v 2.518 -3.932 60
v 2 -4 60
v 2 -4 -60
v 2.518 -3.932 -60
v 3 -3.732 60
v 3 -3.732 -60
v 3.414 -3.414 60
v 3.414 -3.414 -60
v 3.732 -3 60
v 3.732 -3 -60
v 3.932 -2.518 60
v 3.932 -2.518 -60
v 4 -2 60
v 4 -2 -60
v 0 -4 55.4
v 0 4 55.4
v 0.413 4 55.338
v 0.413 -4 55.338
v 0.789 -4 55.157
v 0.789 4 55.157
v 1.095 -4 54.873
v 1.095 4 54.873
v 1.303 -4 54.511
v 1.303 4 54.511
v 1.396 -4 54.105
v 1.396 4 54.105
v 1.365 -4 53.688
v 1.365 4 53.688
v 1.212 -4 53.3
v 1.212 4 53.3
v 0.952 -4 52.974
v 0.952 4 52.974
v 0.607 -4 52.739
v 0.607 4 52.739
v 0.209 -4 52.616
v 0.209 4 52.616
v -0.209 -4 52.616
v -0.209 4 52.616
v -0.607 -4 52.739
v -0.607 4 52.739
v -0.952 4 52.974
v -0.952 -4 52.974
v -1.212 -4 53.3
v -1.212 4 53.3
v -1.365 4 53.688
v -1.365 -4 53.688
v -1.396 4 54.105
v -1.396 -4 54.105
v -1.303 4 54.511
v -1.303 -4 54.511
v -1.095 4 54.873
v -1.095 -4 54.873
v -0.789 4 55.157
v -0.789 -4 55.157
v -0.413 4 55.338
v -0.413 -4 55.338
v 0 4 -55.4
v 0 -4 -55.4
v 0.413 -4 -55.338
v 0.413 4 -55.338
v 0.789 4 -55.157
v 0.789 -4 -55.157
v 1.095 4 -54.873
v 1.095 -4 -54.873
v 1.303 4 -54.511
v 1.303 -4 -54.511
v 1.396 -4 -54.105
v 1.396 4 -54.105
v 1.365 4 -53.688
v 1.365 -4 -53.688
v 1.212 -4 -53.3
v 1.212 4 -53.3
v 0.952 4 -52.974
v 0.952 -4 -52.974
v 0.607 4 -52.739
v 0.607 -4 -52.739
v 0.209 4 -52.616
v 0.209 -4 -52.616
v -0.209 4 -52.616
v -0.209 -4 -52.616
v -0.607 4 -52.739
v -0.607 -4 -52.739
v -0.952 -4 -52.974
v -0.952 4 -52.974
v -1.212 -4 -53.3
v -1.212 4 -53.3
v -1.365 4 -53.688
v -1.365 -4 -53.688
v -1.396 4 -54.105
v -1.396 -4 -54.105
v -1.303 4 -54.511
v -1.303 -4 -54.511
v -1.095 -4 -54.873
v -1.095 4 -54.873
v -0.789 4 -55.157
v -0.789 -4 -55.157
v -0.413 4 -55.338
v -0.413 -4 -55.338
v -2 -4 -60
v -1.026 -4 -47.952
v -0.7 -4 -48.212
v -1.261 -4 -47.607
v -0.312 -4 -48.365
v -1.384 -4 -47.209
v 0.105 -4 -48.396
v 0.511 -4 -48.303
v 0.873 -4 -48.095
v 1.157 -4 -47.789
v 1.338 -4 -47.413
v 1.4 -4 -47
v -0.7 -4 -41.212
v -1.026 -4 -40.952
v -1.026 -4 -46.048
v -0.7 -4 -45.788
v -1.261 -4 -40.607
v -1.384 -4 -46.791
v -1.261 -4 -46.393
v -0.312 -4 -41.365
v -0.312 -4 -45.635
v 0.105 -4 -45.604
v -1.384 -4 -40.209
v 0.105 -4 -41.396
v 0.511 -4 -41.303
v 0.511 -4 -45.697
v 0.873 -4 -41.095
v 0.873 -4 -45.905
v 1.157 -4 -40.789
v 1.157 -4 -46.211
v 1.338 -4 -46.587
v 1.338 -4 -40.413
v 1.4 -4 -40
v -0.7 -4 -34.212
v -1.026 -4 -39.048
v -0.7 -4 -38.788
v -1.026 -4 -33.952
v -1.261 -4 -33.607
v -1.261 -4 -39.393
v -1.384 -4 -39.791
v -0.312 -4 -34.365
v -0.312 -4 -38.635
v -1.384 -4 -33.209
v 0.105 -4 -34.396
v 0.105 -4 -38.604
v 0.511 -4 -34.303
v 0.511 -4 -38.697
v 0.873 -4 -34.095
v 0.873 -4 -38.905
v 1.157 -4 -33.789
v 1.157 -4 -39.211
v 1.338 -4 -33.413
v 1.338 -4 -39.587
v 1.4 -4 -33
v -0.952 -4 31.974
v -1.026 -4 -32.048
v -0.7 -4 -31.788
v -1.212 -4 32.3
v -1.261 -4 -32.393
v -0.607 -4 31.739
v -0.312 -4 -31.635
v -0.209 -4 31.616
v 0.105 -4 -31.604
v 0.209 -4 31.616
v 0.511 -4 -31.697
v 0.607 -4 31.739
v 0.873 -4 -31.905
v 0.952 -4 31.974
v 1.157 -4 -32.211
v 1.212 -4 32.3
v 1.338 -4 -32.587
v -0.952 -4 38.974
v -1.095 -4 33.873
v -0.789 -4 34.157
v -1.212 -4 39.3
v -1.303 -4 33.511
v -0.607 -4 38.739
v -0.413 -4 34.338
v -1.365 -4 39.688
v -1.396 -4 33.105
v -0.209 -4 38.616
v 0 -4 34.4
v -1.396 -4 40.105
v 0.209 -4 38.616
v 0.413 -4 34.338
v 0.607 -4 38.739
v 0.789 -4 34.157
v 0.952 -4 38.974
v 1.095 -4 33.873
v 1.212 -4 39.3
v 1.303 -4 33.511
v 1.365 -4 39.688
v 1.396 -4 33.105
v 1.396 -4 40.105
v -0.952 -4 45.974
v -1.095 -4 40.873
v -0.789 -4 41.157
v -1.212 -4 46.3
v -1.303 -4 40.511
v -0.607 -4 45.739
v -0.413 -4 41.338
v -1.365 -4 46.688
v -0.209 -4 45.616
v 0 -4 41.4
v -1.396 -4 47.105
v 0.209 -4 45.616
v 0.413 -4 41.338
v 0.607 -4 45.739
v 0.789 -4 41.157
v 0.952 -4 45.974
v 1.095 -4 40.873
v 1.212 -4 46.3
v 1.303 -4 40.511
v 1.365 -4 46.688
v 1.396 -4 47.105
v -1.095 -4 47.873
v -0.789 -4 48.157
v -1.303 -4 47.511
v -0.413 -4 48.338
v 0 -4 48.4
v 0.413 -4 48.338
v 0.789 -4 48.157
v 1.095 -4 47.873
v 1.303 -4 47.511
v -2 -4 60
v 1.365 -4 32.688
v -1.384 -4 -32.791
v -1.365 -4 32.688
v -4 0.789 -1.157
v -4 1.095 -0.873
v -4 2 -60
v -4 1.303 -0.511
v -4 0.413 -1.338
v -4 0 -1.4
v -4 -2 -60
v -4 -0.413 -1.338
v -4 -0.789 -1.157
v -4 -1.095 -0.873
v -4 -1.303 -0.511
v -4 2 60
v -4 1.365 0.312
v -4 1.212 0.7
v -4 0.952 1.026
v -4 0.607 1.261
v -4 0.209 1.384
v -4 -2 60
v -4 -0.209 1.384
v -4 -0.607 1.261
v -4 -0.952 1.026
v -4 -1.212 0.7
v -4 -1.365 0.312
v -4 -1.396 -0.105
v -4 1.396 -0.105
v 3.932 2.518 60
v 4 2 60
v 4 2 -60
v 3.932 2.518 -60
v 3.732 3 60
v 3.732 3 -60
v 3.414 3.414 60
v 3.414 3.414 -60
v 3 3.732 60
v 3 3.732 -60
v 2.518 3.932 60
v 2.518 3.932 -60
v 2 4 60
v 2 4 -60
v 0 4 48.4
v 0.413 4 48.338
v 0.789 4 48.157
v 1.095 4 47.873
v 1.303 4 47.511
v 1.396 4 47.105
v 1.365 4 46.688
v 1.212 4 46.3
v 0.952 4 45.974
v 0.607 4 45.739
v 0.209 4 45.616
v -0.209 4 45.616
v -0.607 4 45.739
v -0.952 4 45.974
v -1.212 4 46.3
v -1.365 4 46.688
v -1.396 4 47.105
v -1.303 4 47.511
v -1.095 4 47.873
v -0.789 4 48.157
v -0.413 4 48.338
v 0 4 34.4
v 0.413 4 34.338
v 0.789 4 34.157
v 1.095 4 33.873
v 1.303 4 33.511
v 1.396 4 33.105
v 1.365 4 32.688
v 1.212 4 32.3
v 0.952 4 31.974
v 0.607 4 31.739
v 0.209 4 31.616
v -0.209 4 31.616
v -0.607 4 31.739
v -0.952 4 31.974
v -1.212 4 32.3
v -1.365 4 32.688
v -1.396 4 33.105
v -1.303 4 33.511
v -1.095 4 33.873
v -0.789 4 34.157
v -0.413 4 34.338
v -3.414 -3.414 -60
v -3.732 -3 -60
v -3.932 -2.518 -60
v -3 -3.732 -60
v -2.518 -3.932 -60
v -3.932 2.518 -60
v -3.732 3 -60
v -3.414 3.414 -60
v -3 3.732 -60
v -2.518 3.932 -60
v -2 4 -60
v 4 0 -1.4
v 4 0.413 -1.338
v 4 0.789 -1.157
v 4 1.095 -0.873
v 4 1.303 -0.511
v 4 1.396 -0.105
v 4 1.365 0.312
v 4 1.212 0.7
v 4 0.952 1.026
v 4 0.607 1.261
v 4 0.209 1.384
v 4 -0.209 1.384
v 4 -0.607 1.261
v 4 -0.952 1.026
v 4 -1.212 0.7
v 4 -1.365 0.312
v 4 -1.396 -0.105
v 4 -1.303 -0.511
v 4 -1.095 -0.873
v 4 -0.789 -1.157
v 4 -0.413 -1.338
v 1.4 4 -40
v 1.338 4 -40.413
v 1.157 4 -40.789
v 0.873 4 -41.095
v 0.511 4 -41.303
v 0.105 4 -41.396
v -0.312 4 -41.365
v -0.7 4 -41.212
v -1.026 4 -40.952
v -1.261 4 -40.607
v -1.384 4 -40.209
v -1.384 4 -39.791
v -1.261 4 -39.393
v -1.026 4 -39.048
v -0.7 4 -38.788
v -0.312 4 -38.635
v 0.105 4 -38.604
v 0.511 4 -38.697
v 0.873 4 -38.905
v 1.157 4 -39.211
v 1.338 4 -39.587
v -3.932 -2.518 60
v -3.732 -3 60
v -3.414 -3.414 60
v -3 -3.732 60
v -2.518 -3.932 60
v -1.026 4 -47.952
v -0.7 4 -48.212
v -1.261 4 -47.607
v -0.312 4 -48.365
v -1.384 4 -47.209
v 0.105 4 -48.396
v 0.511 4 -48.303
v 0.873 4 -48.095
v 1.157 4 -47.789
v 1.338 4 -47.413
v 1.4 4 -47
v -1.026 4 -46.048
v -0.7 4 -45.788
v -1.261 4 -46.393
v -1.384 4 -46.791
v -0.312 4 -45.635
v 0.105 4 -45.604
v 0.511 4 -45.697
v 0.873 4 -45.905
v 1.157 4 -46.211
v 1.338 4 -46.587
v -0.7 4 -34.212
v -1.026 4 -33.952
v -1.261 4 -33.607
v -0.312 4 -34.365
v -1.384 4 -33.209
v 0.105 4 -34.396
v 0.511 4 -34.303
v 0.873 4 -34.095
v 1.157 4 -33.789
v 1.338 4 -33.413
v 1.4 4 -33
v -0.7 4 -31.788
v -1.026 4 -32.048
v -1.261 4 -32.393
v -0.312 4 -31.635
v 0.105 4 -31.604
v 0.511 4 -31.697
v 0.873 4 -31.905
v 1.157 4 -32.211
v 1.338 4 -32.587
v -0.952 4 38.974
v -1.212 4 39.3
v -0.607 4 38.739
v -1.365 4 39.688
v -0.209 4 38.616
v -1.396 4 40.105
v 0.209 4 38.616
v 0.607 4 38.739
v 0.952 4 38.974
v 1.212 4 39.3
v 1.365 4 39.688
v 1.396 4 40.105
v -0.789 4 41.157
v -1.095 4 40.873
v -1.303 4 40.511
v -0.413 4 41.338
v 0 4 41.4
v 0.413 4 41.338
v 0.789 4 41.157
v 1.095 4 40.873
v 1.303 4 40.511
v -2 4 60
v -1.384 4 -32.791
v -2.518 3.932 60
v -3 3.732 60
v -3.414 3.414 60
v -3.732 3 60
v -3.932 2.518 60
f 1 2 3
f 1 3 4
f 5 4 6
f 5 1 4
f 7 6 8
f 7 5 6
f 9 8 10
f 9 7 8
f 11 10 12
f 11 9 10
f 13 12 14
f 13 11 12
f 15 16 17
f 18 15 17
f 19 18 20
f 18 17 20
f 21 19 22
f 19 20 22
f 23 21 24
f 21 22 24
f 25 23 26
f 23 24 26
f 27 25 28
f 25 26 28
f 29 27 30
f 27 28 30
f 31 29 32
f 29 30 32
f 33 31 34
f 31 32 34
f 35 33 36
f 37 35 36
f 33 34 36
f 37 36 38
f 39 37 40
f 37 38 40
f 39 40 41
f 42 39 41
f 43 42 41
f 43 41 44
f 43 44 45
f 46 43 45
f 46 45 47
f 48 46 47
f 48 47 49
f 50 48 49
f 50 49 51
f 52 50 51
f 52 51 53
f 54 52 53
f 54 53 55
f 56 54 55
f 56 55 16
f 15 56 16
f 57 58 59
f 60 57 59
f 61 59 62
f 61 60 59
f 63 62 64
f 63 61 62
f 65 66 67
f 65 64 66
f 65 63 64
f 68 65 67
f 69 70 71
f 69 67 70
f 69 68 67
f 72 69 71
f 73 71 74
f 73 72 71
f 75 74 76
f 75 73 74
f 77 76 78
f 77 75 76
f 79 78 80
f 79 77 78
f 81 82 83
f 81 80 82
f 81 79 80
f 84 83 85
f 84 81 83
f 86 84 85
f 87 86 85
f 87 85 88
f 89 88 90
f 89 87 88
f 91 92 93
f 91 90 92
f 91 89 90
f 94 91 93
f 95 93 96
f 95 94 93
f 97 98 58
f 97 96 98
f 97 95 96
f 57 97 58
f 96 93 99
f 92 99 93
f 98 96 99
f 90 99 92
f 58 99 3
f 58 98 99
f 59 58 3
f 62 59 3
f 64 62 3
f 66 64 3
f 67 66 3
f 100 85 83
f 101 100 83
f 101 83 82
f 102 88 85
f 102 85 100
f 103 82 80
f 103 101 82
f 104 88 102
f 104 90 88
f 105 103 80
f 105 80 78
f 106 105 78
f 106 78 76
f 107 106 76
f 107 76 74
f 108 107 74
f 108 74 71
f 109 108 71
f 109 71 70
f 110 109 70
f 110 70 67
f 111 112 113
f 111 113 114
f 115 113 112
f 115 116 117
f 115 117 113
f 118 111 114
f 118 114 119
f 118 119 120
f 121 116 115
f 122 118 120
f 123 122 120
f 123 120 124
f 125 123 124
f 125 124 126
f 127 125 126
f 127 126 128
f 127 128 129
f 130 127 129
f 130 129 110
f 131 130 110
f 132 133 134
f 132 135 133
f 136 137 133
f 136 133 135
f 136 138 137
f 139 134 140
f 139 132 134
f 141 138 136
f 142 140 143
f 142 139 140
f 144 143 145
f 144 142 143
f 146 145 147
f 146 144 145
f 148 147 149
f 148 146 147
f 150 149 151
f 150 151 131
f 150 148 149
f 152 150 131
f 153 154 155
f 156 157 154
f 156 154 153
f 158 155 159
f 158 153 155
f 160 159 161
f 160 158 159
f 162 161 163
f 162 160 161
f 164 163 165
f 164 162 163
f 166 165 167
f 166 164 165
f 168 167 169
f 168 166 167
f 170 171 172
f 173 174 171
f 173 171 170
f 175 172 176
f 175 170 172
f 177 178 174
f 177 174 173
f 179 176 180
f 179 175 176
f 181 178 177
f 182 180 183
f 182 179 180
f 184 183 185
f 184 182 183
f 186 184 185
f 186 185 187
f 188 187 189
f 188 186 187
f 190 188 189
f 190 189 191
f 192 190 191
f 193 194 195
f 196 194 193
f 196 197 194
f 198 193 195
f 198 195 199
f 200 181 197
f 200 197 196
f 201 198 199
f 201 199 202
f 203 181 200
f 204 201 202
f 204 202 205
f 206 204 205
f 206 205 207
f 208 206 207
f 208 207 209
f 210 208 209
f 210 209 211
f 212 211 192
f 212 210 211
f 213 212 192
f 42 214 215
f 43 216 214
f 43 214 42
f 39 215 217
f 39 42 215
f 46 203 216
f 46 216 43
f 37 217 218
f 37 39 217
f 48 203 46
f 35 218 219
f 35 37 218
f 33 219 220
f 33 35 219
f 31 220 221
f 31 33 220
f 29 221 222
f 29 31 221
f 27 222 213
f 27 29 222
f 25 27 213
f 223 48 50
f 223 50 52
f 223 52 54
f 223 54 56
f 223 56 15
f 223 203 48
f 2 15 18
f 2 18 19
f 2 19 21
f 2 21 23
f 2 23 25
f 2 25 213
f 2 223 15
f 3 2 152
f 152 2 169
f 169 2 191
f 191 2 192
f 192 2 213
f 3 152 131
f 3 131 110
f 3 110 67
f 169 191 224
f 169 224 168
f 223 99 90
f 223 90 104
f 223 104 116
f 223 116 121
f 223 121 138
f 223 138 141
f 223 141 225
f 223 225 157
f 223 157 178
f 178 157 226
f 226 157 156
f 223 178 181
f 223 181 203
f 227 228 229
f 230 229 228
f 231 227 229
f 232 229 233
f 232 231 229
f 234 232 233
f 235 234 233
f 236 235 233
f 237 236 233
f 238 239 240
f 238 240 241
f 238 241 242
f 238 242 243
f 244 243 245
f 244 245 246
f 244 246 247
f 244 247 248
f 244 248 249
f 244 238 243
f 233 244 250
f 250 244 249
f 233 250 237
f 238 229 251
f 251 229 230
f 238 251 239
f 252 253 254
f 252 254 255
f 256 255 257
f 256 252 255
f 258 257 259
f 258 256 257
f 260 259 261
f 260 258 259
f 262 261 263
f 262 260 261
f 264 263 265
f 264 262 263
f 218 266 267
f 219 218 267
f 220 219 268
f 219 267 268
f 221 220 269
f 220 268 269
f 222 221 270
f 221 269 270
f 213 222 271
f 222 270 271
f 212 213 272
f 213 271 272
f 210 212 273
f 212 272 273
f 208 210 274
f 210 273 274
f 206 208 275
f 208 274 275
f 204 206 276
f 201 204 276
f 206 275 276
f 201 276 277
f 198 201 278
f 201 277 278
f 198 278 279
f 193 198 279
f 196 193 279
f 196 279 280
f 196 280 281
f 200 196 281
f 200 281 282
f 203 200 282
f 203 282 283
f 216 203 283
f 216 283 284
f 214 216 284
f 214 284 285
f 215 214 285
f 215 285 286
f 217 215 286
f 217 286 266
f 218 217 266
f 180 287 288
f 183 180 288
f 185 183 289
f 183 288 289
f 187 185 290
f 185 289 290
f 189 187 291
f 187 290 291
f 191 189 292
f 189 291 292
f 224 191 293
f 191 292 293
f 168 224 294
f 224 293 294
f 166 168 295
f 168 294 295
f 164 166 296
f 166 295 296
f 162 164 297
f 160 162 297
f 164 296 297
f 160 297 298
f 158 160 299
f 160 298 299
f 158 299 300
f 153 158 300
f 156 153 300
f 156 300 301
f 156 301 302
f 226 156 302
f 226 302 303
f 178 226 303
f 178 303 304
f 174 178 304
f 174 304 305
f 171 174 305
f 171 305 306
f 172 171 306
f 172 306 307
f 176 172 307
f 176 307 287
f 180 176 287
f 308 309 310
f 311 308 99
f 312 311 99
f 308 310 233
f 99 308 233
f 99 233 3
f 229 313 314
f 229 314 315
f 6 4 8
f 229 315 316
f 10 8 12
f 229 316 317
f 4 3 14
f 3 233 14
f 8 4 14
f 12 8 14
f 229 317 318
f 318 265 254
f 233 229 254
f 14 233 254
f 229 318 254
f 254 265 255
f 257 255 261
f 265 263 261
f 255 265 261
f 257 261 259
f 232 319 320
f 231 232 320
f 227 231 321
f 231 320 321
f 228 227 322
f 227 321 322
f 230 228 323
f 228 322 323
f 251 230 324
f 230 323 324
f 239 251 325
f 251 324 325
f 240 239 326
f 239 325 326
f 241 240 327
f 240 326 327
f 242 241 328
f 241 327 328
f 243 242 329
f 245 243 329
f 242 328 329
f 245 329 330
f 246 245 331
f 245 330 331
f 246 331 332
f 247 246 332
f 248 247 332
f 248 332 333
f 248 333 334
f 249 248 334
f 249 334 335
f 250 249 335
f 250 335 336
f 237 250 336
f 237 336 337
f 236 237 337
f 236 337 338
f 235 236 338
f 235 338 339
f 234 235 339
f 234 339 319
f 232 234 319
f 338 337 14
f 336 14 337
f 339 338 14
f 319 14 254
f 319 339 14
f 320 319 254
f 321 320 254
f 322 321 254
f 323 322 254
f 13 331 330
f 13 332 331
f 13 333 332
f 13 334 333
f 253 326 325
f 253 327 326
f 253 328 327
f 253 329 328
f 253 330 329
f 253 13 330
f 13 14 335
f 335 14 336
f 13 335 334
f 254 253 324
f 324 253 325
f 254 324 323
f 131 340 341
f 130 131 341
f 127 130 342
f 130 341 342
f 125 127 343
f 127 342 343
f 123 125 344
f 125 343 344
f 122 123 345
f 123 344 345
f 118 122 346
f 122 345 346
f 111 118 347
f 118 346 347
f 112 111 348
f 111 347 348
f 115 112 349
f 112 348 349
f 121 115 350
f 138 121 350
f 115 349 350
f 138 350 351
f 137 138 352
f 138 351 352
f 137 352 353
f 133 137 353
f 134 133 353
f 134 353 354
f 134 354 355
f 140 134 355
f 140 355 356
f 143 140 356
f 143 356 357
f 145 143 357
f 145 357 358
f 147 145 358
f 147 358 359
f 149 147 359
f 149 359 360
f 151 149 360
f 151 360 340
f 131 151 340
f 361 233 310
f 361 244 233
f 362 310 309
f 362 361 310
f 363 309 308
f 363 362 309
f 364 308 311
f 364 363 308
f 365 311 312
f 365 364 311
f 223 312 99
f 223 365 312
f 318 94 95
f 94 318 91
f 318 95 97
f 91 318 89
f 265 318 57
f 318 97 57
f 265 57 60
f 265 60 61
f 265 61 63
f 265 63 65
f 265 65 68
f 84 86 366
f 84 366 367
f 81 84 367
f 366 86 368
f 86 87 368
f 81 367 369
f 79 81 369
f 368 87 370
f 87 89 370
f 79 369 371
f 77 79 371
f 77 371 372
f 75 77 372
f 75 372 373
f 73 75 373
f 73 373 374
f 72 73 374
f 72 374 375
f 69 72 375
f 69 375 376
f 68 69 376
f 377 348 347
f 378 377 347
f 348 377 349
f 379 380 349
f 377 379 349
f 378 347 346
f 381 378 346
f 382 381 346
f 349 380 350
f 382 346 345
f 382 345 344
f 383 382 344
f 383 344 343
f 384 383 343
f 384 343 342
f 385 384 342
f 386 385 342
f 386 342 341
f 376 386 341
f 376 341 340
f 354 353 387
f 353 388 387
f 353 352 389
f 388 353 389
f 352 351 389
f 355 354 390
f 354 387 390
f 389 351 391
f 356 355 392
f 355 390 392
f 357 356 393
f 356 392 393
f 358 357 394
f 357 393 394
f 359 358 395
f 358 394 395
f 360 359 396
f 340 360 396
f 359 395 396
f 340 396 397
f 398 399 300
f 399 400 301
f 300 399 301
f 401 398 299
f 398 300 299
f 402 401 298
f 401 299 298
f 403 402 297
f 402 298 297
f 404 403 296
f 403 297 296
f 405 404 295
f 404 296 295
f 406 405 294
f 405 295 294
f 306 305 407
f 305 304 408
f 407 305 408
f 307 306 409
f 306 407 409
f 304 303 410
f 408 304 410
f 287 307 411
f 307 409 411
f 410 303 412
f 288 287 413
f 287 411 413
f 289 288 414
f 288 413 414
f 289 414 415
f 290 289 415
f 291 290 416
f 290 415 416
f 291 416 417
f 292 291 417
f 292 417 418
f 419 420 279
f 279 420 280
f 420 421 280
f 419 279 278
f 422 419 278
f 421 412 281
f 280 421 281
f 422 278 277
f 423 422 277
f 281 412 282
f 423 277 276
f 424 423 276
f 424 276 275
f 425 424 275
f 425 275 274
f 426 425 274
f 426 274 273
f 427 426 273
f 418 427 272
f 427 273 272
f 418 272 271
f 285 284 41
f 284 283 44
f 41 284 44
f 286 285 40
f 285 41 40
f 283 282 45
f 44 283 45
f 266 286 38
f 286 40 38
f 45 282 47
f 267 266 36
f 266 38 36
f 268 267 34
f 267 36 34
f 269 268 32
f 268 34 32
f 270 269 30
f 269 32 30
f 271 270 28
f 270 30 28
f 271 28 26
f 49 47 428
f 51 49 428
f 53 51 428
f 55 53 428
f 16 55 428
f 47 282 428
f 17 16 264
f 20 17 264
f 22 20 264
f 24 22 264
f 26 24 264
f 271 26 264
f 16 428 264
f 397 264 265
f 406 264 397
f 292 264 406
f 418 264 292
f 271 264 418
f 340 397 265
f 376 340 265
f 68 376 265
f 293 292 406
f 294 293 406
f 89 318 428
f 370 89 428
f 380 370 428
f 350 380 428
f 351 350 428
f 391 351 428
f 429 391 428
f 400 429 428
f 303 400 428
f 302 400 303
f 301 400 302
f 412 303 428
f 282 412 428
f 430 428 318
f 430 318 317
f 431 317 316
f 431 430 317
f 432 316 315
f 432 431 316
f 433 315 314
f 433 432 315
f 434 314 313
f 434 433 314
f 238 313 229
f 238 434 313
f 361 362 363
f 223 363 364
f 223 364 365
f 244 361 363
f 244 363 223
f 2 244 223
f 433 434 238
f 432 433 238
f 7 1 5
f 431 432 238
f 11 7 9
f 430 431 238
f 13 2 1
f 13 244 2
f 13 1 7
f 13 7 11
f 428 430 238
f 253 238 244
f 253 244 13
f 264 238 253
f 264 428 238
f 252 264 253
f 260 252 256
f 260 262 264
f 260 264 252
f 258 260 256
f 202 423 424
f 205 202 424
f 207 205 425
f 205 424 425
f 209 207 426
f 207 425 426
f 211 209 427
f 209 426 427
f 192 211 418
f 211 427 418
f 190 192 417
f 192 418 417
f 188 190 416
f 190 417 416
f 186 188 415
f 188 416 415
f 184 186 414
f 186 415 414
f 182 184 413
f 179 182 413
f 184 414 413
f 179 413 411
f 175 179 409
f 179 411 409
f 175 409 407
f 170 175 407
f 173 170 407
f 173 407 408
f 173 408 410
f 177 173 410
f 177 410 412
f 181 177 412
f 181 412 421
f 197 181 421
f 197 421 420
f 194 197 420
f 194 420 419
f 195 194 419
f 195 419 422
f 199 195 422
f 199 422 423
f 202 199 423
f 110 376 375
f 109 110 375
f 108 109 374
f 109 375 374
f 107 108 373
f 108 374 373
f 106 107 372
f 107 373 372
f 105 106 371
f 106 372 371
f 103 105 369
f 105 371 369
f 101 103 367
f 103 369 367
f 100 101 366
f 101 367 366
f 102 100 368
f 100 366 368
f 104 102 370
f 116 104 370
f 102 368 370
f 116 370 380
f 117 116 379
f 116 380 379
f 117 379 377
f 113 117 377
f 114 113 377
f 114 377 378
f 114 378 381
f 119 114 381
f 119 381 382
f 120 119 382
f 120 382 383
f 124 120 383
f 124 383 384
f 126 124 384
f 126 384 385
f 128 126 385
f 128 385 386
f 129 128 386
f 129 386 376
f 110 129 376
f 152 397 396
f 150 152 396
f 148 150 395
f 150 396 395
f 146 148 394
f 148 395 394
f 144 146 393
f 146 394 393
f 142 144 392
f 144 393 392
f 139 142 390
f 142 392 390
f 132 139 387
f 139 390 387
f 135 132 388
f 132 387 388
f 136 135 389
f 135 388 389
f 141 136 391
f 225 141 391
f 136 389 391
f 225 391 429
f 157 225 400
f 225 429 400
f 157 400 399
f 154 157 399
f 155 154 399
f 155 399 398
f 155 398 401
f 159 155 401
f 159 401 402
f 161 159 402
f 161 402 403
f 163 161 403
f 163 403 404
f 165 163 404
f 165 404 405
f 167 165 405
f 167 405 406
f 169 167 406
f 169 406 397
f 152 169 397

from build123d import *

# Parameters (mm, degrees)
EXTRUDE_1_DEPTH                  = 60
SKETCH_2_R                       = 1.4
CUT_EXTRUDE_1_DEPTH              = 61.663003552
SKETCH_3_R                       = 1.4
CUT_EXTRUDE_2_DEPTH              = 61.663003552
PATTERN_LINEAR_1_COUNT           = 4
PATTERN_LINEAR_1_PITCH           = 7
PATTERN_LINEAR_1_COPY_1_SKETCH_R = 1.4
PATTERN_LINEAR_1_COPY_1_DEPTH    = 61.663003552
PATTERN_LINEAR_1_COPY_2_SKETCH_R = 1.4
PATTERN_LINEAR_1_COPY_2_DEPTH    = 61.663003552
PATTERN_LINEAR_1_COPY_3_SKETCH_R = 1.4
PATTERN_LINEAR_1_COPY_3_DEPTH    = 61.663003552
MIRROR_2_COPY_1_SKETCH_R         = 1.4
MIRROR_2_COPY_1_DEPTH            = 61.663003552
MIRROR_2_COPY_2_SKETCH_R         = 1.4
MIRROR_2_COPY_2_DEPTH            = 61.663003552
MIRROR_2_COPY_3_SKETCH_R         = 1.4
MIRROR_2_COPY_3_DEPTH            = 61.663003552
MIRROR_2_COPY_4_SKETCH_R         = 1.4
MIRROR_2_COPY_4_DEPTH            = 61.663003552
MIRROR_2_COPY_5_SKETCH_R         = 1.4
MIRROR_2_COPY_5_DEPTH            = 61.663003552
MIRROR_2_COPY_6_SKETCH_R         = 1.4
MIRROR_2_COPY_6_DEPTH            = 61.663003552
MIRROR_2_COPY_7_SKETCH_R         = 1.4
MIRROR_2_COPY_7_DEPTH            = 61.663003552
EXTRUDE_2_DEPTH                  = 8
EXTRUDE_START                    = -8
EXTRUDE_3_DEPTH                  = 8


with BuildPart() as part:
    # 草图1 → 凸台-拉伸1 (new, symmetric)
    with BuildSketch(Plane.XY):
        with BuildLine():
            Line((-2, -4), (2, -4))
            ThreePointArc((2, -4), (3.414213562, -3.414213562), (4, -2))
            Line((4, -2), (4, 2))
            ThreePointArc((4, 2), (3.414213562, 3.414213562), (2, 4))
            Line((2, 4), (-2, 4))
            ThreePointArc((-2, 4), (-3.414213562, 3.414213562), (-4, 2))
            Line((-4, 2), (-4, -2))
            ThreePointArc((-4, -2), (-3.414213562, -3.414213562), (-2, -4))
        make_face()
    extrude(amount=EXTRUDE_1_DEPTH, both=True)

    # 草图2 → 切除-拉伸1 (cut, through all)
    with BuildSketch(Plane(origin=(4, 0, 0), x_dir=(0, 0, -1), z_dir=(1, 0, 0))):
        Circle(SKETCH_2_R)
    extrude(amount=-CUT_EXTRUDE_1_DEPTH, mode=Mode.SUBTRACT)

    # 草图3 → 切除-拉伸2 (cut, through all)
    with BuildSketch(Plane(origin=(0, 4, 0), x_dir=(1, 0, 0), z_dir=(0, 1, 0))):
        with Locations(Location((0, -54, 0), (0, 0, 270))):
            Circle(SKETCH_3_R)
    cut_extrude_2 = extrude(amount=-CUT_EXTRUDE_2_DEPTH, mode=Mode.SUBTRACT)

    # 镜向1: 切除-拉伸2 across plane
    add(cut_extrude_2.mirror(Plane.XY), mode=Mode.SUBTRACT)

    # 阵列(线性)1: 切除-拉伸2 ×4
    with Locations(*[(0, 0, i * PATTERN_LINEAR_1_PITCH) for i in range(1, PATTERN_LINEAR_1_COUNT)]):
        add(cut_extrude_2, mode=Mode.SUBTRACT)

    # 阵列(线性)1 copy 1 sketch → 阵列(线性)1 copy 1 (cut, through all)
    with BuildSketch(Plane(origin=(0, 4, 7), x_dir=(1, 0, 0), z_dir=(0, 1, 0))):
        with Locations((0, 54)):
            Circle(PATTERN_LINEAR_1_COPY_1_SKETCH_R)
    extrude(amount=-PATTERN_LINEAR_1_COPY_1_DEPTH, mode=Mode.SUBTRACT)

    # 阵列(线性)1 copy 2 sketch → 阵列(线性)1 copy 2 (cut, through all)
    with BuildSketch(Plane(origin=(0, 4, 14), x_dir=(1, 0, 0), z_dir=(0, 1, 0))):
        with Locations((0, 54)):
            Circle(PATTERN_LINEAR_1_COPY_2_SKETCH_R)
    extrude(amount=-PATTERN_LINEAR_1_COPY_2_DEPTH, mode=Mode.SUBTRACT)

    # 阵列(线性)1 copy 3 sketch → 阵列(线性)1 copy 3 (cut, through all)
    with BuildSketch(Plane(origin=(0, 4, 21), x_dir=(1, 0, 0), z_dir=(0, 1, 0))):
        with Locations((0, 54)):
            Circle(PATTERN_LINEAR_1_COPY_3_SKETCH_R)
    extrude(amount=-PATTERN_LINEAR_1_COPY_3_DEPTH, mode=Mode.SUBTRACT)

    # 镜向2 copy 1 sketch → 镜向2 copy 1 (cut, through all)
    with BuildSketch(Plane(origin=(0, 4, -7), x_dir=(1, 0, 0), z_dir=(0, 1, 0))):
        with Locations((0, 54)):
            Circle(MIRROR_2_COPY_1_SKETCH_R)
    extrude(amount=-MIRROR_2_COPY_1_DEPTH, mode=Mode.SUBTRACT)

    # 镜向2 copy 2 sketch → 镜向2 copy 2 (cut, through all)
    with BuildSketch(Plane(origin=(0, 4, -14), x_dir=(1, 0, 0), z_dir=(0, 1, 0))):
        with Locations((0, 54)):
            Circle(MIRROR_2_COPY_2_SKETCH_R)
    extrude(amount=-MIRROR_2_COPY_2_DEPTH, mode=Mode.SUBTRACT)

    # 镜向2 copy 3 sketch → 镜向2 copy 3 (cut, through all)
    with BuildSketch(Plane(origin=(0, 4, -21), x_dir=(1, 0, 0), z_dir=(0, 1, 0))):
        with Locations((0, 54)):
            Circle(MIRROR_2_COPY_3_SKETCH_R)
    extrude(amount=-MIRROR_2_COPY_3_DEPTH, mode=Mode.SUBTRACT)

    # 镜向2 copy 4 sketch → 镜向2 copy 4 (cut, through all)
    with BuildSketch(Plane(origin=(0, 4, -7), x_dir=(1, 0, 0), z_dir=(0, 1, 0))):
        with Locations(Location((0, -54, 0), (0, 0, 270))):
            Circle(MIRROR_2_COPY_4_SKETCH_R)
    extrude(amount=-MIRROR_2_COPY_4_DEPTH, mode=Mode.SUBTRACT)

    # 镜向2 copy 5 sketch → 镜向2 copy 5 (cut, through all)
    with BuildSketch(Plane(origin=(0, 4, -14), x_dir=(1, 0, 0), z_dir=(0, 1, 0))):
        with Locations(Location((0, -54, 0), (0, 0, 270))):
            Circle(MIRROR_2_COPY_5_SKETCH_R)
    extrude(amount=-MIRROR_2_COPY_5_DEPTH, mode=Mode.SUBTRACT)

    # 镜向2 copy 6 sketch → 镜向2 copy 6 (cut, through all)
    with BuildSketch(Plane(origin=(0, 4, -21), x_dir=(1, 0, 0), z_dir=(0, 1, 0))):
        with Locations(Location((0, -54, 0), (0, 0, 270))):
            Circle(MIRROR_2_COPY_6_SKETCH_R)
    extrude(amount=-MIRROR_2_COPY_6_DEPTH, mode=Mode.SUBTRACT)

    # 镜向2 copy 7 sketch → 镜向2 copy 7 (cut, through all)
    with BuildSketch(Plane(origin=(0, 4, 0), x_dir=(1, 0, 0), z_dir=(0, 1, 0))):
        with Locations((0, 54)):
            Circle(MIRROR_2_COPY_7_SKETCH_R)
    extrude(amount=-MIRROR_2_COPY_7_DEPTH, mode=Mode.SUBTRACT)

    # 草图4 → 凸台-拉伸2 (add)
    with BuildSketch(Plane(origin=(0, 4, 0), x_dir=(1, 0, 0), z_dir=(0, 1, 0))):
        with BuildLine():
            Line((-0.979795897, -60), (0.979795897, -60))
            ThreePointArc((0.979795897, -60), (0, -59.6), (-0.979795897, -60))
        make_face()
    extrude(amount=-EXTRUDE_2_DEPTH)

    # 草图5 → 凸台-拉伸3 (add)
    with BuildSketch(Plane.XZ.offset(4).offset(EXTRUDE_START)):
        with BuildLine():
            Line((-0.979795897, -60), (0.979795897, -60))
            ThreePointArc((0.979795897, -60), (0, -59.6), (-0.979795897, -60))
        make_face()
    extrude(amount=EXTRUDE_3_DEPTH)


solid = part.part
